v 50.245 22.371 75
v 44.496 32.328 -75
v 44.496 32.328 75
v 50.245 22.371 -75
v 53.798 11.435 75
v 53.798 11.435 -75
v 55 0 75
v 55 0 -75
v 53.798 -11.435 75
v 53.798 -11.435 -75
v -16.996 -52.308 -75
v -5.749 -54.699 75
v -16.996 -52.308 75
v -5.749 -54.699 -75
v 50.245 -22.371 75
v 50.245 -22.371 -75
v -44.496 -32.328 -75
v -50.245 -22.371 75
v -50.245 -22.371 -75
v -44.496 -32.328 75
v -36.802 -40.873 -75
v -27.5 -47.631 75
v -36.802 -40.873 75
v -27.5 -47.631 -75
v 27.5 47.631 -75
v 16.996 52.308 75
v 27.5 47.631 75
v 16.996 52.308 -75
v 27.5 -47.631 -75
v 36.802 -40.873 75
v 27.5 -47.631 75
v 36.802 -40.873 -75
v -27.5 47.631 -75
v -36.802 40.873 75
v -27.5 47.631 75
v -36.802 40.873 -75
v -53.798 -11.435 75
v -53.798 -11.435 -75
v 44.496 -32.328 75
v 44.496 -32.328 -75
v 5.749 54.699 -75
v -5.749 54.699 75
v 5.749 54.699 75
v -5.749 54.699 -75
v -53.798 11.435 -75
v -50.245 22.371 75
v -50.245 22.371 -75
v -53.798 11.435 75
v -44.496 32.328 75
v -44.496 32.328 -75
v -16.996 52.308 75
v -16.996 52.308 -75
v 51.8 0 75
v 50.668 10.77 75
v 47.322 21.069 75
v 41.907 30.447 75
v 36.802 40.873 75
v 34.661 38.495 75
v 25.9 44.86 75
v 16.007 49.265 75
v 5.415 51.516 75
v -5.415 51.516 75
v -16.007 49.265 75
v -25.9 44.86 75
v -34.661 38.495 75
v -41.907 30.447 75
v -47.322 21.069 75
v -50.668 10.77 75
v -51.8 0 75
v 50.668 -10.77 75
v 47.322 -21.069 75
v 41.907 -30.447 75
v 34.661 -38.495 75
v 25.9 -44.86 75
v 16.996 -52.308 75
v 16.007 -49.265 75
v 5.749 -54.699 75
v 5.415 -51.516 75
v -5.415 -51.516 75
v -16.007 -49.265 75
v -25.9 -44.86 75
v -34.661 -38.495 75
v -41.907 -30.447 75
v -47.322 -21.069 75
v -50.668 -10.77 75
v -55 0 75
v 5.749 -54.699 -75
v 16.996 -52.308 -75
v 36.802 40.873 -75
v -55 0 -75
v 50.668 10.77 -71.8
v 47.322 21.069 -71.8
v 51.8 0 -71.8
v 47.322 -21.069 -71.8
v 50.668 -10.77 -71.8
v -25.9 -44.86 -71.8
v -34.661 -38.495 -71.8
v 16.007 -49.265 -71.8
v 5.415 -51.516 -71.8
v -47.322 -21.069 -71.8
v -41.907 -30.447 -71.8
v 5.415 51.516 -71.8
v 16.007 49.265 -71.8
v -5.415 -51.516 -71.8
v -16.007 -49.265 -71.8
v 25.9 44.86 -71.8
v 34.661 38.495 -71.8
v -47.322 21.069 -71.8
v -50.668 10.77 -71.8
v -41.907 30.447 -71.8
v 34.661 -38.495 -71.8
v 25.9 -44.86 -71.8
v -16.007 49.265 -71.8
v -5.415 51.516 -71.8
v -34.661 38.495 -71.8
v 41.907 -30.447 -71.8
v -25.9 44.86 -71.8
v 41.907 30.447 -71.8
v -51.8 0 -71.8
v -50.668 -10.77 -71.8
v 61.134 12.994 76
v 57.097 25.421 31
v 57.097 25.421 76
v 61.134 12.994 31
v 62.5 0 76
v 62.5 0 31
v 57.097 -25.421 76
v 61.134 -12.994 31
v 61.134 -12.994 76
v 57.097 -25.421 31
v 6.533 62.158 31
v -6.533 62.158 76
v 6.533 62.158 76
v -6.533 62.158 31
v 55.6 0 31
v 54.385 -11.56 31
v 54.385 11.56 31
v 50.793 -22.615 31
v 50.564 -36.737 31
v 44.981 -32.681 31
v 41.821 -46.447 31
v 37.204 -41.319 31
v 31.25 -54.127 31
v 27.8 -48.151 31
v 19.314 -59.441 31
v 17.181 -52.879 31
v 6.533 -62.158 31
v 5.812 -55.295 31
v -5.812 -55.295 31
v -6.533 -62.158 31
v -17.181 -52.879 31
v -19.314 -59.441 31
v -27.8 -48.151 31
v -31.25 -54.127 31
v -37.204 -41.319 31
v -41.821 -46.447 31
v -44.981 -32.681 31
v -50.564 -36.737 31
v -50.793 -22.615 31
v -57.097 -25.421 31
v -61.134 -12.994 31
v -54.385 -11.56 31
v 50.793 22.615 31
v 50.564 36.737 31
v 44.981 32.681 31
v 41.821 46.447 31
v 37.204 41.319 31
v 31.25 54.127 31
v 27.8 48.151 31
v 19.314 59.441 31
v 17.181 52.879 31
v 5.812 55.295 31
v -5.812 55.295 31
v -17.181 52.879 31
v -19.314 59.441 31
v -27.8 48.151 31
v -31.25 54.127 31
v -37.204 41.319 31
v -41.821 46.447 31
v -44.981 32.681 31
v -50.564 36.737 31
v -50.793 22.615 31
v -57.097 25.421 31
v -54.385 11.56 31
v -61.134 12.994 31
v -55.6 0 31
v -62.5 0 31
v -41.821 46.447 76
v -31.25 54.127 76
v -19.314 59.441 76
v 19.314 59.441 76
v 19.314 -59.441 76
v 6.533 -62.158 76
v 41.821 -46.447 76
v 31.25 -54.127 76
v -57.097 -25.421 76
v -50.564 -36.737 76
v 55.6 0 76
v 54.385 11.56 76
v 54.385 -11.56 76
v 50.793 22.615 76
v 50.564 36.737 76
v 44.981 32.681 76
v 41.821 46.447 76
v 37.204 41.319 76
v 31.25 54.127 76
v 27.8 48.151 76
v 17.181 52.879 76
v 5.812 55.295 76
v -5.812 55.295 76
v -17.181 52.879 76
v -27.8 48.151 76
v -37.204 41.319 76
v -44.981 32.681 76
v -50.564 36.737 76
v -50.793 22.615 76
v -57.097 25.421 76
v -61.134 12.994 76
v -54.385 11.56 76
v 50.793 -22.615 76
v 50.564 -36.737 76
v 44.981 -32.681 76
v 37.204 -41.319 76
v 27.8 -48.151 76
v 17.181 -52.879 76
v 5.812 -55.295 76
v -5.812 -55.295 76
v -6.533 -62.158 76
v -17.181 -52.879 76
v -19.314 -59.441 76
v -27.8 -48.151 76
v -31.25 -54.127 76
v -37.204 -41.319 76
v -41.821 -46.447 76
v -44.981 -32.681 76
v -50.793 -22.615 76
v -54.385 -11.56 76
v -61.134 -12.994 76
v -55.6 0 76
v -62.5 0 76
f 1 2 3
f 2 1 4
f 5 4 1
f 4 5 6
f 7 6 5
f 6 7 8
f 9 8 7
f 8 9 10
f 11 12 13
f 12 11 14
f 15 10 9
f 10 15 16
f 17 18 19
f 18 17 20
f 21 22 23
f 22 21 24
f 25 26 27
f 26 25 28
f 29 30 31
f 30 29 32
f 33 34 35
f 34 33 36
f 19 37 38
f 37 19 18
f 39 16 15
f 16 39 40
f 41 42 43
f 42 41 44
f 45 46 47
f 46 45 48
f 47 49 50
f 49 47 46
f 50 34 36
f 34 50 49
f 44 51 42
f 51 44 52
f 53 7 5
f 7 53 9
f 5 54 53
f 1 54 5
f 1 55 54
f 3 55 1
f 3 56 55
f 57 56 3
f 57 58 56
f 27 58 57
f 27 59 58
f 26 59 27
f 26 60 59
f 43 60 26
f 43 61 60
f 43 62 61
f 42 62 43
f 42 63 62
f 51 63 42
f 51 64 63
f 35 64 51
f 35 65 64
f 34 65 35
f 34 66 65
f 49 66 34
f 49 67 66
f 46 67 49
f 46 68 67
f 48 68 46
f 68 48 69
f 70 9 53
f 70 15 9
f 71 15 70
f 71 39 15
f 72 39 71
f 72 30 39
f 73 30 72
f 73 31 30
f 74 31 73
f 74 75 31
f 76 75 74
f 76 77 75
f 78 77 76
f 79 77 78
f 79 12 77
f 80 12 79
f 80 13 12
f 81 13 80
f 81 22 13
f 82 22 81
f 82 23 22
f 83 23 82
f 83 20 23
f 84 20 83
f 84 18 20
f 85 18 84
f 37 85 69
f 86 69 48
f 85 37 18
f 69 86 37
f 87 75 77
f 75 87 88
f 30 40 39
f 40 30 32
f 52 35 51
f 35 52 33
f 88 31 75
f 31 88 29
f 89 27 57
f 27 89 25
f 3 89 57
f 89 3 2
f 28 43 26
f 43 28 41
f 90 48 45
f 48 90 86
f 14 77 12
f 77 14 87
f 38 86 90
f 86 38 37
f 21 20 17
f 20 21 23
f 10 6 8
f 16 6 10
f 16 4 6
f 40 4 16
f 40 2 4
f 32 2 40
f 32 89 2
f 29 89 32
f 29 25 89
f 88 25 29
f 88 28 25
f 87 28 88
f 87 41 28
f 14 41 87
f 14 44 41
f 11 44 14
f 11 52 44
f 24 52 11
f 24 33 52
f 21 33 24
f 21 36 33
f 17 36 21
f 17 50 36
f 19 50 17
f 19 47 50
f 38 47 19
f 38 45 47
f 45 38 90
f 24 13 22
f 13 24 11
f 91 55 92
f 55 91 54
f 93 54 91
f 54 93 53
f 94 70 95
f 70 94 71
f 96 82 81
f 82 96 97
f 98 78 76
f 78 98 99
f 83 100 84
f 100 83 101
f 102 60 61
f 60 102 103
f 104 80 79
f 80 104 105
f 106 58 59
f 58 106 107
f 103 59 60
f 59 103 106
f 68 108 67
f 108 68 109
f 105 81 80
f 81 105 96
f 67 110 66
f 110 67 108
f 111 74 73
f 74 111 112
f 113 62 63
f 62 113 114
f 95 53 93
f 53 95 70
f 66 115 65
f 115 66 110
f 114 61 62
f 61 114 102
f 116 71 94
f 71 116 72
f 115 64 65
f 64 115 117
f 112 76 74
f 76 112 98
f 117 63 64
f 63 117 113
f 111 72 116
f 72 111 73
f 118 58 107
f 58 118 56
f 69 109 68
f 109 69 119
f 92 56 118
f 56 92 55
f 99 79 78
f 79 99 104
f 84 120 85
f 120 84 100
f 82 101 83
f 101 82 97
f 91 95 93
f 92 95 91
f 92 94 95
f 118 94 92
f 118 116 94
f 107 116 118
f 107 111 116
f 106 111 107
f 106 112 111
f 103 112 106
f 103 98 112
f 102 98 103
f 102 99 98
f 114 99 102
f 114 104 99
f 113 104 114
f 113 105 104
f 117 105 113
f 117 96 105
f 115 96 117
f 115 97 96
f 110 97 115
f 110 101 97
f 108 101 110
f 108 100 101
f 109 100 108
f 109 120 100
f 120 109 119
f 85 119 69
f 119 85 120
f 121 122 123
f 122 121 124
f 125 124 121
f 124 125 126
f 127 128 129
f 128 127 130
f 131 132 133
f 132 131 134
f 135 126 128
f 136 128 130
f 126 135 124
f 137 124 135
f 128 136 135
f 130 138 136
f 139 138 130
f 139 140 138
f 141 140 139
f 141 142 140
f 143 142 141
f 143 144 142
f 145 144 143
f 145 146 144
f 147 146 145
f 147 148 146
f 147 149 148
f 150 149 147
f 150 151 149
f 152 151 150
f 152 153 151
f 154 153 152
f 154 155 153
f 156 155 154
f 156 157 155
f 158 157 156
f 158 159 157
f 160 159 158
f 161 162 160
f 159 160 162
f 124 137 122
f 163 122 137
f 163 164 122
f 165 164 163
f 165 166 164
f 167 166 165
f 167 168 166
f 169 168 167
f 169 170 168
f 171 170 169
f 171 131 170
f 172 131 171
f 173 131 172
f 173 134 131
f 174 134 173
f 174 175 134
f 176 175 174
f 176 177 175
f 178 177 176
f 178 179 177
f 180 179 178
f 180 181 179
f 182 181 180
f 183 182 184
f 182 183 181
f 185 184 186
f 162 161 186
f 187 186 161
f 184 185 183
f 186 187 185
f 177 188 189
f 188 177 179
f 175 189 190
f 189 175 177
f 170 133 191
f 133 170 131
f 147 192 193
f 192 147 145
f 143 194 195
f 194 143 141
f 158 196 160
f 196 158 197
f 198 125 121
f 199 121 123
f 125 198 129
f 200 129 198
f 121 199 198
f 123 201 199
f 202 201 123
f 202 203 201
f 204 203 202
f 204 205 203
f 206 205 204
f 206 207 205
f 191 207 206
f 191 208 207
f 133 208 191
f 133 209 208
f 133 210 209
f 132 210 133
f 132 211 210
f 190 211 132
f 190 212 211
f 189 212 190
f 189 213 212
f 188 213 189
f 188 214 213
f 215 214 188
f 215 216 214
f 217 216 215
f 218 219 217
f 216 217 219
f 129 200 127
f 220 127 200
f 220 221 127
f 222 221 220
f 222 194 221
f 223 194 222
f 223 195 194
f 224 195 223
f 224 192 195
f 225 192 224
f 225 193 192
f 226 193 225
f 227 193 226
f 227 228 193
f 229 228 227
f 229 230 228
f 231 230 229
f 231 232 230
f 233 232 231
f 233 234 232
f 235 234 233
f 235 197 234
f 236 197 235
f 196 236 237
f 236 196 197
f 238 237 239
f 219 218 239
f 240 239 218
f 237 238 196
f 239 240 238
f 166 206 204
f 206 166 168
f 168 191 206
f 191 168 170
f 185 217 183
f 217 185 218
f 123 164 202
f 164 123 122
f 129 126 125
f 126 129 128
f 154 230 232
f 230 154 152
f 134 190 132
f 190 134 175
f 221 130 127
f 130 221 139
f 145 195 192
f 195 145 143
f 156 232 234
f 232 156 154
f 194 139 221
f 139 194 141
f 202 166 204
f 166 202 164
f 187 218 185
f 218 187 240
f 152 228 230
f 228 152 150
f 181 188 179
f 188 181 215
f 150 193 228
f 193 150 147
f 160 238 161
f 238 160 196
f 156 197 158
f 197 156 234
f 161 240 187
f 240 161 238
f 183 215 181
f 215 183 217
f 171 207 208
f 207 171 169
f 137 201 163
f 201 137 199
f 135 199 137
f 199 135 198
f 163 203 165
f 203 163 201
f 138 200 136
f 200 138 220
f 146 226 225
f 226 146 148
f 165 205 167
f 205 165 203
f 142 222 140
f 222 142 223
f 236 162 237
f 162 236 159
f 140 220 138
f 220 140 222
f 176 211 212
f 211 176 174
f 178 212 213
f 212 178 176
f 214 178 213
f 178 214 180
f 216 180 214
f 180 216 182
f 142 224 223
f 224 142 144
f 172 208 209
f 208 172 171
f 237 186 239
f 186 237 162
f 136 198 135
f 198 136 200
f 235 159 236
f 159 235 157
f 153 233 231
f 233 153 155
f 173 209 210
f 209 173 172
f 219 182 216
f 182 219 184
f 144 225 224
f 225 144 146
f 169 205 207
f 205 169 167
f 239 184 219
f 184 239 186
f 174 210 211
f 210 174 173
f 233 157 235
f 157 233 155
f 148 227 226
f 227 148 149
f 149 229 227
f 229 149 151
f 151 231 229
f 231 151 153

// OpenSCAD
// Parameters
length_mm = 150; //[75:300:1]
outer_diameter_mm = 110; //[55:220:1]
wall_thickness_mm = 3.2; //[1.6:6.4:0.1]
include_end_fitting = 1; //[0:1:1]
fitting_length_mm = 45; //[20:90:1]
fitting_outer_diameter_mm = 125; //[112:160:1]
fitting_wall_thickness_mm = 4; //[2:8:0.1]
socket_clearance_mm = 0.6; //[0.2:1.5:0.1]
overlap_mm = 1; //[0.5:2:0.1]

// Main pipe segment
module ht_pipe_segment() {
  color([0.85, 0.85, 0.8]) {
    difference() {
      cylinder(h=length_mm, r=outer_diameter_mm/2, center=true);
      translate([0, 0, wall_thickness_mm])
        cylinder(h=length_mm, r=outer_diameter_mm/2 - wall_thickness_mm, center=true);
    }
  }
}

// End fitting detail
module end_fitting_detail() {
  color([0.85, 0.85, 0.8]) {
    difference() {
      translate([0, 0, length_mm/2 - fitting_length_mm/2 + overlap_mm])
        cylinder(h=fitting_length_mm, r=fitting_outer_diameter_mm/2, center=true);
      translate([0, 0, length_mm/2 - fitting_length_mm/2 + overlap_mm])
        cylinder(h=fitting_length_mm, r=outer_diameter_mm/2 + socket_clearance_mm, center=true);
    }
  }
}

// Complete pipe with optional end fitting
module ht_pipe() {
  if (include_end_fitting) {
    union() {
      ht_pipe_segment();
      end_fitting_detail();
    }
  } else {
    ht_pipe_segment();
  }
}

// Assembly
module assembly() {
  ht_pipe();
}

assembly();
